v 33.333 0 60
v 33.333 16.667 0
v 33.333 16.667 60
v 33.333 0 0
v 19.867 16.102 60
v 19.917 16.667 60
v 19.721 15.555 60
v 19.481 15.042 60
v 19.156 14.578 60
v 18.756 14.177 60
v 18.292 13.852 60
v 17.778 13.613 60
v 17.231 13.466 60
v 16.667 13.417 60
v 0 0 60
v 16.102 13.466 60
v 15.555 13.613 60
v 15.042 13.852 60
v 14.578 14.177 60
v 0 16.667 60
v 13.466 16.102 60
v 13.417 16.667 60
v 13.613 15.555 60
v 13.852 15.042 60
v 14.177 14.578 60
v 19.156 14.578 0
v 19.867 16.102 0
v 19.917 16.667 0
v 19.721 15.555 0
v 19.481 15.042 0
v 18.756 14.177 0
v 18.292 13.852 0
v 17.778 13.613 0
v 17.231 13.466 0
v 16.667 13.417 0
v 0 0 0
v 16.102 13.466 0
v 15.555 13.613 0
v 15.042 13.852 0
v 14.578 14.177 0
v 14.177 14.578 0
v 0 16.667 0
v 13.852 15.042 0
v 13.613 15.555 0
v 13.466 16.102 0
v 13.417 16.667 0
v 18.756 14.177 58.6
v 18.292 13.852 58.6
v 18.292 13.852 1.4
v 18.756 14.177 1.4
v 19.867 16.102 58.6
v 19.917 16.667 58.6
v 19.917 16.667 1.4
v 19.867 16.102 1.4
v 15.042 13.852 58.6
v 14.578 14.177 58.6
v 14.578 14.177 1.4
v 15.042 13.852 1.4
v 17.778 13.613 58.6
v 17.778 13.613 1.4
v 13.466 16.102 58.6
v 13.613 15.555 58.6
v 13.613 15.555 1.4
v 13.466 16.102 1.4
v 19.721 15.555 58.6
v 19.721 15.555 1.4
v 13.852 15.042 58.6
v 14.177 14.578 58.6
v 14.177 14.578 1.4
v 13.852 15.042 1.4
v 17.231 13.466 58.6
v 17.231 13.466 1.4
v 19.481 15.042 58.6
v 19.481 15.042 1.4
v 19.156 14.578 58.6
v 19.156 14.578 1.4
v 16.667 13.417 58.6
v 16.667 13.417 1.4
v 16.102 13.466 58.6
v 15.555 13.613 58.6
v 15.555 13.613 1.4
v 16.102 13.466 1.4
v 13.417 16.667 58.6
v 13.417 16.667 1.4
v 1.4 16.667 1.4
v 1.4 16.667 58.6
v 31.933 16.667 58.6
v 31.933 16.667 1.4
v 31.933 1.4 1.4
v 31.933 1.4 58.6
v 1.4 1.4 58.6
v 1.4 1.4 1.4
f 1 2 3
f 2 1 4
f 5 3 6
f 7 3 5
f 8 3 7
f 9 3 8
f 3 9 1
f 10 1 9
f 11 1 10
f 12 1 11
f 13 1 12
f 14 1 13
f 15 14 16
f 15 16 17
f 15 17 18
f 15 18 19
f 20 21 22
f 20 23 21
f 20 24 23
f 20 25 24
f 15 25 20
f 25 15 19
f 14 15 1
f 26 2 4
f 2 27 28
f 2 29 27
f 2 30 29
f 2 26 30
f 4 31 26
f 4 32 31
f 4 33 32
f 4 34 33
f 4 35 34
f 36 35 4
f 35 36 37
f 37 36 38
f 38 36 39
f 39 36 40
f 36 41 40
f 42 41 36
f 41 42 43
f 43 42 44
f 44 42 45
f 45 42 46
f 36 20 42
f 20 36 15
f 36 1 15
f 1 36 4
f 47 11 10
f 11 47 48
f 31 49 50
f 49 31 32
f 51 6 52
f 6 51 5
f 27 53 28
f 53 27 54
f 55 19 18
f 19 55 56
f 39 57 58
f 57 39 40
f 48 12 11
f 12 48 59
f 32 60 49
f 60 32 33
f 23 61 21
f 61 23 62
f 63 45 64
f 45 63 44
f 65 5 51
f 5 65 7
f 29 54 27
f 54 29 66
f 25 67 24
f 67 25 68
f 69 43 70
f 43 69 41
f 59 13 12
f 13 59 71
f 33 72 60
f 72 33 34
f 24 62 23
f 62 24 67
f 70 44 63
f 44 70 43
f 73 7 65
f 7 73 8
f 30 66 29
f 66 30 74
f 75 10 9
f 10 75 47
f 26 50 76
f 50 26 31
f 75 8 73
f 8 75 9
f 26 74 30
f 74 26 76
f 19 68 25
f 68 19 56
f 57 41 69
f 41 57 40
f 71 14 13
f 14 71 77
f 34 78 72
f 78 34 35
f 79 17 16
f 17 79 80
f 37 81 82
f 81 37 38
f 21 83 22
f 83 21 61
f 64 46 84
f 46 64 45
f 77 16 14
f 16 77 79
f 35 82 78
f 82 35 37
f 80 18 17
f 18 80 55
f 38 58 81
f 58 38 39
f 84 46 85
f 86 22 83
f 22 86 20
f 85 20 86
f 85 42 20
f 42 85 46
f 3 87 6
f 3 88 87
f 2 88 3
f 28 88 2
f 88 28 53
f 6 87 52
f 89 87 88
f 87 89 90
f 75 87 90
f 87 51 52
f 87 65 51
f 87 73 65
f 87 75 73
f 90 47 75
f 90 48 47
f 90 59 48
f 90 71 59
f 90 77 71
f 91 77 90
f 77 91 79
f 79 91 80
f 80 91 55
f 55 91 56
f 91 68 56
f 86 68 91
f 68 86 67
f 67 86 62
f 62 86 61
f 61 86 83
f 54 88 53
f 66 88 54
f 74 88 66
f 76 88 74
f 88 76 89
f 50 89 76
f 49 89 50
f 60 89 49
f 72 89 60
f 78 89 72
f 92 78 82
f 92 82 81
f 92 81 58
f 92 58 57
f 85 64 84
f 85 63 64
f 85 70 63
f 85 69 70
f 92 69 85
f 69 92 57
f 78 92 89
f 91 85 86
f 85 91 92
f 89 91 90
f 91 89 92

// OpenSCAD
//Höhe
h=60;
//Toleranz
to=1;
//Dicke
t=1.4;
//Durchmesser Kabel
dk=6.5;
//Größe Box
gb=h/1.8;

$fn=36;

module klotzmitloch()
{
difference()
{
cube([gb,gb,h]);

//translate([t,t,t])
//cube([gb-t-t,gb-t-t,h-t-t])

translate([gb/2, gb/2, -to-t])
color("red")
cylinder(h = h+to+to+t+t, d = dk);
}
}

module halberklotzmitloch()
{
difference()
{
    klotzmitloch();
    
    translate([0,gb/2,0])
    cube([gb,gb,h]);
}
}

difference()
{
halberklotzmitloch();

translate([t,t,t])
cube([gb-t-t,gb-t-t,h-t-t]);
}
